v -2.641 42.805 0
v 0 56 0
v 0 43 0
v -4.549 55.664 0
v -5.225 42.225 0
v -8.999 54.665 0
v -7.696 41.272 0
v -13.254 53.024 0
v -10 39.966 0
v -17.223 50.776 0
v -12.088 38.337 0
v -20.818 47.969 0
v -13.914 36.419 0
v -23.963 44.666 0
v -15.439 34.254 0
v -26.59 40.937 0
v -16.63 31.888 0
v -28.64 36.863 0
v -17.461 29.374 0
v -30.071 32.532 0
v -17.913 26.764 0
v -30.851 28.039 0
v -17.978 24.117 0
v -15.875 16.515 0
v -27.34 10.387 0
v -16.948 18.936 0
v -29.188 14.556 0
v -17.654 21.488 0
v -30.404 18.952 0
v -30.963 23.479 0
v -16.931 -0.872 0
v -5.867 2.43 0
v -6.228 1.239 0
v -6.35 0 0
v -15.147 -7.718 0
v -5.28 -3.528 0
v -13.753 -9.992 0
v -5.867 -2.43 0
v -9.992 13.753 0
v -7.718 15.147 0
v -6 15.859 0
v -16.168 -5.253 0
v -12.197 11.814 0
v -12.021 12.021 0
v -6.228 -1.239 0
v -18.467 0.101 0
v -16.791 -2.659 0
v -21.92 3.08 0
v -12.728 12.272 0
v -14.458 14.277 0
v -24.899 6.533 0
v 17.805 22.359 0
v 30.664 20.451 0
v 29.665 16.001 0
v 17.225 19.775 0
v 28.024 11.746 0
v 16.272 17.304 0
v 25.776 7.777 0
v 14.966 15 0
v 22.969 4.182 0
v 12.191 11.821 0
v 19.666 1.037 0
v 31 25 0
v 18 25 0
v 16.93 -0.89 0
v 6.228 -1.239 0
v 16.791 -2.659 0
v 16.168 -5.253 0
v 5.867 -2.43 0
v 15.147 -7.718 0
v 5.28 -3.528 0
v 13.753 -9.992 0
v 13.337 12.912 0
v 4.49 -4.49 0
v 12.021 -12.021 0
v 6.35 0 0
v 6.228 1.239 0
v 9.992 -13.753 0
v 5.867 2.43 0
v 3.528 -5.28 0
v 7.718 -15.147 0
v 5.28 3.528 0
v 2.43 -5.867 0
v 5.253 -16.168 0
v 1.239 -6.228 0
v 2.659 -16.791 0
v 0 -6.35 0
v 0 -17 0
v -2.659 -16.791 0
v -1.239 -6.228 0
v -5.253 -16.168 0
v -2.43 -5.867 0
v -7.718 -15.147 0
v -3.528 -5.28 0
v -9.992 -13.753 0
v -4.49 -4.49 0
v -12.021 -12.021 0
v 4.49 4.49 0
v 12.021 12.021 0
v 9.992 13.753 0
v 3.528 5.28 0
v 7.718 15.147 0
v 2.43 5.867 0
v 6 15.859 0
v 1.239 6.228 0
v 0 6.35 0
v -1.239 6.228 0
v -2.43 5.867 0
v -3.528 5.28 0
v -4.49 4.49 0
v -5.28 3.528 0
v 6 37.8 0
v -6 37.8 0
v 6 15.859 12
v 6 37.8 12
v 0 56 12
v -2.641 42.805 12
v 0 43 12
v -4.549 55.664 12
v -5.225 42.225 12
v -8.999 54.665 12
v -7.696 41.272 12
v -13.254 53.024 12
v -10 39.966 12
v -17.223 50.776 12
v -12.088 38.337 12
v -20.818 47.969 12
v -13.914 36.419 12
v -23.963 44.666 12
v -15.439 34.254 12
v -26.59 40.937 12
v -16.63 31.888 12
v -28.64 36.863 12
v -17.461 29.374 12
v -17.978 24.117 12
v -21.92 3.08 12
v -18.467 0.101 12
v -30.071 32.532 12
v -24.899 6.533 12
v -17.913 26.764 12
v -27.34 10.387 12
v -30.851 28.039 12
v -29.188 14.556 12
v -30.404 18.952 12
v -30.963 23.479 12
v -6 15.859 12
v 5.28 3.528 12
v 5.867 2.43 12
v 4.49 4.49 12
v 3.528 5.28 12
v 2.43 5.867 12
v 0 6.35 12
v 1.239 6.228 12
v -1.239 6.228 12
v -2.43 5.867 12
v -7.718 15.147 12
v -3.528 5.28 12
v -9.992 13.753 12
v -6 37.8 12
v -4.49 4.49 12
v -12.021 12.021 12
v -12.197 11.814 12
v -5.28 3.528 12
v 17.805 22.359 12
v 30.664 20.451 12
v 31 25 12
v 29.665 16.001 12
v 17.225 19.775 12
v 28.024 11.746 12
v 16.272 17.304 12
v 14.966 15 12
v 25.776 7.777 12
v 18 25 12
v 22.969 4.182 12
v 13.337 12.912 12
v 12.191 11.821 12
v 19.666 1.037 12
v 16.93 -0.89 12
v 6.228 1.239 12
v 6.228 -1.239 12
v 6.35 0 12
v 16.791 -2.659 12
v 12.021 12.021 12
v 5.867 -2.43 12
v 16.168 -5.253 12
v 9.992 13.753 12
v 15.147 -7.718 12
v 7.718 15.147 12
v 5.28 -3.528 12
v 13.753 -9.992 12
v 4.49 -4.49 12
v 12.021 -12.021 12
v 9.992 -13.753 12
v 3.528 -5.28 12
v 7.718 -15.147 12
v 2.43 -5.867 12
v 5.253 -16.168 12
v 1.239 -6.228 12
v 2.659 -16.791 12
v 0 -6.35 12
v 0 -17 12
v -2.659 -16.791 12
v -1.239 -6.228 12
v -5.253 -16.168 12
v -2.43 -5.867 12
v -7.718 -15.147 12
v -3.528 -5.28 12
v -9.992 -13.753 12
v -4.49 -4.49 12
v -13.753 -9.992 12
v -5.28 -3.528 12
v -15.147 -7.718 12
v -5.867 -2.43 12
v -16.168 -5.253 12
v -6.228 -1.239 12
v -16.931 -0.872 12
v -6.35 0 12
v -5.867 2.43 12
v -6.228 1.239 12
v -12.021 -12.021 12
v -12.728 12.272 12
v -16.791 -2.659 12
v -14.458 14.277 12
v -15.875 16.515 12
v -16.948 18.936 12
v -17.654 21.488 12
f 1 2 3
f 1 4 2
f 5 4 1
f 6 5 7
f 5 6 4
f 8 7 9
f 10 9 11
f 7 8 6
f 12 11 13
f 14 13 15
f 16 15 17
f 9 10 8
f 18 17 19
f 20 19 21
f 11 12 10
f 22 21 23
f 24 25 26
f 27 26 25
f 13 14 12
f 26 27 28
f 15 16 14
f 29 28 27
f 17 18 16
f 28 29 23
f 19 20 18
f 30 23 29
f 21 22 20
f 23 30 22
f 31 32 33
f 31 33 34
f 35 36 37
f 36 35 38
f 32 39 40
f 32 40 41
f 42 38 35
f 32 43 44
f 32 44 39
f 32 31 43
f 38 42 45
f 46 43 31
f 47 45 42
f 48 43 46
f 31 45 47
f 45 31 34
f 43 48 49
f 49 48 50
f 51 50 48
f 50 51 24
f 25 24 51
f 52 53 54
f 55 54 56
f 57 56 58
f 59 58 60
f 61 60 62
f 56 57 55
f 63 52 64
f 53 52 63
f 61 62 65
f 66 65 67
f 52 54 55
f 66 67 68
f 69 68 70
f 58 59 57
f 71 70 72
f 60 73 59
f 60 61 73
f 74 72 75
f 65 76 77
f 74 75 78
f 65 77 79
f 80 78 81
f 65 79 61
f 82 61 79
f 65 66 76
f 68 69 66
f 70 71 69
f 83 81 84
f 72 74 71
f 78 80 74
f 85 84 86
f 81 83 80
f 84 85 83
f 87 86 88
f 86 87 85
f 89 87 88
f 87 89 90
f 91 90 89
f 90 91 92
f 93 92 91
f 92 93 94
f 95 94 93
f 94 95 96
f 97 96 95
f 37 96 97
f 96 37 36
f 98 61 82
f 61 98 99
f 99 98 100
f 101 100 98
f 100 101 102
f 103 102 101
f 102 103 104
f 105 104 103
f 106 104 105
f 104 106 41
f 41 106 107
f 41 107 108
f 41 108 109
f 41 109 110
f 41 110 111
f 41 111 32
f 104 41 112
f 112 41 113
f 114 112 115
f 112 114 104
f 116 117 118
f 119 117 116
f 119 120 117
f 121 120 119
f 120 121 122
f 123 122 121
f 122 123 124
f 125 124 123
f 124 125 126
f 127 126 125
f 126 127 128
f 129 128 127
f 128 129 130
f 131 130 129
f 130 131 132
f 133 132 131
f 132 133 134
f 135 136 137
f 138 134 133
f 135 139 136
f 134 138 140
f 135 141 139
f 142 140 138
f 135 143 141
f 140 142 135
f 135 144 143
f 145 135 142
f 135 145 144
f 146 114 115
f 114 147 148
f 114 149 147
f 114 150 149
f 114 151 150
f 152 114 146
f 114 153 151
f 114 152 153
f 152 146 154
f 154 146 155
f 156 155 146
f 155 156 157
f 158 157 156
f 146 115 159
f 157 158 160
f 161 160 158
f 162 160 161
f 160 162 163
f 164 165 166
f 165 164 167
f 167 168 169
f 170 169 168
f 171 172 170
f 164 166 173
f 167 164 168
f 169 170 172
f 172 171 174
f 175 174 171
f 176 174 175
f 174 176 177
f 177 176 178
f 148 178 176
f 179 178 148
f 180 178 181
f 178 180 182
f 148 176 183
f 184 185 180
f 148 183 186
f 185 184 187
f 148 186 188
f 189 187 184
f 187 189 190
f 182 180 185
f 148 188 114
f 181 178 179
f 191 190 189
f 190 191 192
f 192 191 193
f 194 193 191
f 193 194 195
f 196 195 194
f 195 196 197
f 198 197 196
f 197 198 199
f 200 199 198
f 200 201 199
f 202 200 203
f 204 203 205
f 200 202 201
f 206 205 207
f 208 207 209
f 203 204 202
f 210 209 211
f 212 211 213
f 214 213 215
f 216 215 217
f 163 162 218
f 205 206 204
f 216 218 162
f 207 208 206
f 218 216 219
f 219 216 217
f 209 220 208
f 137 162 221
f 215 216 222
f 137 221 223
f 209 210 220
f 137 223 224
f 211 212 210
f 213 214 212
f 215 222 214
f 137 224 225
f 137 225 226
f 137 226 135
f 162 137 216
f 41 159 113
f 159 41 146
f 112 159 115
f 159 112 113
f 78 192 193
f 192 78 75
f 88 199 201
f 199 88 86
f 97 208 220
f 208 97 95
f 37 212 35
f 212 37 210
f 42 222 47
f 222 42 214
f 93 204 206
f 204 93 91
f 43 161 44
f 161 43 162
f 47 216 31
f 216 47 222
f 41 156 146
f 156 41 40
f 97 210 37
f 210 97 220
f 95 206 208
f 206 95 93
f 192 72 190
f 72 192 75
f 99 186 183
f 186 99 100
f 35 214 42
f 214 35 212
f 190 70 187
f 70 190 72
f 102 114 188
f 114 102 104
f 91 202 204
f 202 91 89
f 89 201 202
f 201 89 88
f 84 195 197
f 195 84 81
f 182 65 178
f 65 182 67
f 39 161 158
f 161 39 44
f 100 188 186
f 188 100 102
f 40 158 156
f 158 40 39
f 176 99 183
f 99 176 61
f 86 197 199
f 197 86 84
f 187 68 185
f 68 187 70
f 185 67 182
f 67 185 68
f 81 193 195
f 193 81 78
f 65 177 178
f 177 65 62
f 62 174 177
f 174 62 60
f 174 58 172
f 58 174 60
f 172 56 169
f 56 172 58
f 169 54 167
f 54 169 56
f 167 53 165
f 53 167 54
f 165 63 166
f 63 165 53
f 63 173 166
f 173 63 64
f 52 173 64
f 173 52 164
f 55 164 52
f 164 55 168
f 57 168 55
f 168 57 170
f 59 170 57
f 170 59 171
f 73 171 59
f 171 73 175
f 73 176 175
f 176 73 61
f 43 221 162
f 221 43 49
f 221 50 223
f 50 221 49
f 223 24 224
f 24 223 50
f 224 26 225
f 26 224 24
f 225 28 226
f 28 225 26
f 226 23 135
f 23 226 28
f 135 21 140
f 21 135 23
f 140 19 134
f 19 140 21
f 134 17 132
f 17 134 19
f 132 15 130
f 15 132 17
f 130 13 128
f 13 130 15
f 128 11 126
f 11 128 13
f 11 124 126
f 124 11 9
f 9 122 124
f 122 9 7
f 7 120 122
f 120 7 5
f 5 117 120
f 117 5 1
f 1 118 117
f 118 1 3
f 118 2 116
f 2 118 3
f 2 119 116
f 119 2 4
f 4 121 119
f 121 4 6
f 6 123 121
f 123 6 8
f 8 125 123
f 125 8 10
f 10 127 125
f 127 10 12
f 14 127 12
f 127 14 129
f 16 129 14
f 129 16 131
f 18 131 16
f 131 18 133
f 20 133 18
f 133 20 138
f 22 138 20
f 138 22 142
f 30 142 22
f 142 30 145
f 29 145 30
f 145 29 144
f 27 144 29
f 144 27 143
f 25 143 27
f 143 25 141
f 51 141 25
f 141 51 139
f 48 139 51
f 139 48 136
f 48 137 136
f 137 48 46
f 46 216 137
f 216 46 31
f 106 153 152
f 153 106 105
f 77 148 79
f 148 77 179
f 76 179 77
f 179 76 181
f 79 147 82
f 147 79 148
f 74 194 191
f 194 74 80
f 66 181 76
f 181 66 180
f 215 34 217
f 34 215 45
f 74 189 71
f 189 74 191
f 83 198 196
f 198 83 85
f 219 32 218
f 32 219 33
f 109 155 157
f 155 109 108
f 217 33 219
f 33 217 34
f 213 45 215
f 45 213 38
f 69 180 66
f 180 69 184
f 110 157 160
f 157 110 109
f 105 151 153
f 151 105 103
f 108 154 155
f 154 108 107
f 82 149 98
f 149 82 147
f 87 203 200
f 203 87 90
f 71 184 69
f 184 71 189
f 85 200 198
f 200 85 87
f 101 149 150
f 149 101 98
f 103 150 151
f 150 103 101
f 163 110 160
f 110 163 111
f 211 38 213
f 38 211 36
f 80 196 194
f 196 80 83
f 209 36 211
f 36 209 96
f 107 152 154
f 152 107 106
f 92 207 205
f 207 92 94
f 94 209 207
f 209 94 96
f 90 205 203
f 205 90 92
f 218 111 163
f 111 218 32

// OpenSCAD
$fn = 32;

// ----------------------------------------------------------------------
// Hook: 50 mm shank into a 18 mm curl, 12 mm thick
// ----------------------------------------------------------------------

// --- parameters (mm) ---
shank_len = 50;           // shank length from the boss centre
shank_w = 12;             // shank width
boss_d = 34;              // boss diameter
bore_d = 12.7;            // boss bore
curl_in = 18;             // curl inner radius
curl_out = 31;            // curl outer radius
curl_sweep = 270;         // curl sweep angle
hook_t = 12;              // hook thickness

shank_profile = [[-6, 37.8], [6, 37.8], [6, 15], [-6, 15]];
boss_profile = [[17, 0], [16.791, 2.659], [16.168, 5.253], [15.147, 7.718], [13.753, 9.992], [12.021, 12.021], [9.992, 13.753], [7.718, 15.147], [5.253, 16.168], [2.659, 16.791], [0, 17], [-2.659, 16.791], [-5.253, 16.168], [-7.718, 15.147], [-9.992, 13.753], [-12.021, 12.021], [-13.753, 9.992], [-15.147, 7.718], [-16.168, 5.253], [-16.791, 2.659], [-17, 0], [-16.791, -2.659], [-16.168, -5.253], [-15.147, -7.718], [-13.753, -9.992], [-12.021, -12.021], [-9.992, -13.753], [-7.718, -15.147], [-5.253, -16.168], [-2.659, -16.791], [0, -17], [2.659, -16.791], [5.253, -16.168], [7.718, -15.147], [9.992, -13.753], [12.021, -12.021], [13.753, -9.992], [15.147, -7.718], [16.168, -5.253], [16.791, -2.659]];
curl_profile = [[0, 56], [-4.549, 55.664], [-8.999, 54.665], [-13.254, 53.024], [-17.223, 50.776], [-20.818, 47.969], [-23.963, 44.666], [-26.59, 40.937], [-28.64, 36.863], [-30.071, 32.532], [-30.851, 28.039], [-30.963, 23.479], [-30.404, 18.952], [-29.188, 14.556], [-27.34, 10.387], [-24.899, 6.533], [-21.92, 3.08], [-18.467, 0.101], [-14.613, -2.34], [-10.444, -4.188], [-6.048, -5.404], [-1.521, -5.963], [3.039, -5.851], [7.532, -5.071], [11.863, -3.64], [15.937, -1.59], [19.666, 1.037], [22.969, 4.182], [25.776, 7.777], [28.024, 11.746], [29.665, 16.001], [30.664, 20.451], [31, 25], [18, 25], [17.805, 22.359], [17.225, 19.775], [16.272, 17.304], [14.966, 15], [13.337, 12.912], [11.419, 11.086], [9.254, 9.561], [6.888, 8.37], [4.374, 7.539], [1.764, 7.087], [-0.883, 7.022], [-3.512, 7.346], [-6.064, 8.052], [-8.485, 9.125], [-10.723, 10.542], [-12.728, 12.272], [-14.458, 14.277], [-15.875, 16.515], [-16.948, 18.936], [-17.654, 21.488], [-17.978, 24.117], [-17.913, 26.764], [-17.461, 29.374], [-16.63, 31.888], [-15.439, 34.254], [-13.914, 36.419], [-12.088, 38.337], [-10, 39.966], [-7.696, 41.272], [-5.225, 42.225], [-2.641, 42.805], [0, 43]];

difference() {
  union() {
    /* three overlapping outlines: shank, boss and the smooth curl */
    linear_extrude(height = hook_t) polygon(shank_profile);
    linear_extrude(height = hook_t) polygon(boss_profile);
    linear_extrude(height = hook_t) polygon(curl_profile);
  }
  translate([0, 0, -2.5]) cylinder(h = hook_t + 5, d = bore_d);
}
